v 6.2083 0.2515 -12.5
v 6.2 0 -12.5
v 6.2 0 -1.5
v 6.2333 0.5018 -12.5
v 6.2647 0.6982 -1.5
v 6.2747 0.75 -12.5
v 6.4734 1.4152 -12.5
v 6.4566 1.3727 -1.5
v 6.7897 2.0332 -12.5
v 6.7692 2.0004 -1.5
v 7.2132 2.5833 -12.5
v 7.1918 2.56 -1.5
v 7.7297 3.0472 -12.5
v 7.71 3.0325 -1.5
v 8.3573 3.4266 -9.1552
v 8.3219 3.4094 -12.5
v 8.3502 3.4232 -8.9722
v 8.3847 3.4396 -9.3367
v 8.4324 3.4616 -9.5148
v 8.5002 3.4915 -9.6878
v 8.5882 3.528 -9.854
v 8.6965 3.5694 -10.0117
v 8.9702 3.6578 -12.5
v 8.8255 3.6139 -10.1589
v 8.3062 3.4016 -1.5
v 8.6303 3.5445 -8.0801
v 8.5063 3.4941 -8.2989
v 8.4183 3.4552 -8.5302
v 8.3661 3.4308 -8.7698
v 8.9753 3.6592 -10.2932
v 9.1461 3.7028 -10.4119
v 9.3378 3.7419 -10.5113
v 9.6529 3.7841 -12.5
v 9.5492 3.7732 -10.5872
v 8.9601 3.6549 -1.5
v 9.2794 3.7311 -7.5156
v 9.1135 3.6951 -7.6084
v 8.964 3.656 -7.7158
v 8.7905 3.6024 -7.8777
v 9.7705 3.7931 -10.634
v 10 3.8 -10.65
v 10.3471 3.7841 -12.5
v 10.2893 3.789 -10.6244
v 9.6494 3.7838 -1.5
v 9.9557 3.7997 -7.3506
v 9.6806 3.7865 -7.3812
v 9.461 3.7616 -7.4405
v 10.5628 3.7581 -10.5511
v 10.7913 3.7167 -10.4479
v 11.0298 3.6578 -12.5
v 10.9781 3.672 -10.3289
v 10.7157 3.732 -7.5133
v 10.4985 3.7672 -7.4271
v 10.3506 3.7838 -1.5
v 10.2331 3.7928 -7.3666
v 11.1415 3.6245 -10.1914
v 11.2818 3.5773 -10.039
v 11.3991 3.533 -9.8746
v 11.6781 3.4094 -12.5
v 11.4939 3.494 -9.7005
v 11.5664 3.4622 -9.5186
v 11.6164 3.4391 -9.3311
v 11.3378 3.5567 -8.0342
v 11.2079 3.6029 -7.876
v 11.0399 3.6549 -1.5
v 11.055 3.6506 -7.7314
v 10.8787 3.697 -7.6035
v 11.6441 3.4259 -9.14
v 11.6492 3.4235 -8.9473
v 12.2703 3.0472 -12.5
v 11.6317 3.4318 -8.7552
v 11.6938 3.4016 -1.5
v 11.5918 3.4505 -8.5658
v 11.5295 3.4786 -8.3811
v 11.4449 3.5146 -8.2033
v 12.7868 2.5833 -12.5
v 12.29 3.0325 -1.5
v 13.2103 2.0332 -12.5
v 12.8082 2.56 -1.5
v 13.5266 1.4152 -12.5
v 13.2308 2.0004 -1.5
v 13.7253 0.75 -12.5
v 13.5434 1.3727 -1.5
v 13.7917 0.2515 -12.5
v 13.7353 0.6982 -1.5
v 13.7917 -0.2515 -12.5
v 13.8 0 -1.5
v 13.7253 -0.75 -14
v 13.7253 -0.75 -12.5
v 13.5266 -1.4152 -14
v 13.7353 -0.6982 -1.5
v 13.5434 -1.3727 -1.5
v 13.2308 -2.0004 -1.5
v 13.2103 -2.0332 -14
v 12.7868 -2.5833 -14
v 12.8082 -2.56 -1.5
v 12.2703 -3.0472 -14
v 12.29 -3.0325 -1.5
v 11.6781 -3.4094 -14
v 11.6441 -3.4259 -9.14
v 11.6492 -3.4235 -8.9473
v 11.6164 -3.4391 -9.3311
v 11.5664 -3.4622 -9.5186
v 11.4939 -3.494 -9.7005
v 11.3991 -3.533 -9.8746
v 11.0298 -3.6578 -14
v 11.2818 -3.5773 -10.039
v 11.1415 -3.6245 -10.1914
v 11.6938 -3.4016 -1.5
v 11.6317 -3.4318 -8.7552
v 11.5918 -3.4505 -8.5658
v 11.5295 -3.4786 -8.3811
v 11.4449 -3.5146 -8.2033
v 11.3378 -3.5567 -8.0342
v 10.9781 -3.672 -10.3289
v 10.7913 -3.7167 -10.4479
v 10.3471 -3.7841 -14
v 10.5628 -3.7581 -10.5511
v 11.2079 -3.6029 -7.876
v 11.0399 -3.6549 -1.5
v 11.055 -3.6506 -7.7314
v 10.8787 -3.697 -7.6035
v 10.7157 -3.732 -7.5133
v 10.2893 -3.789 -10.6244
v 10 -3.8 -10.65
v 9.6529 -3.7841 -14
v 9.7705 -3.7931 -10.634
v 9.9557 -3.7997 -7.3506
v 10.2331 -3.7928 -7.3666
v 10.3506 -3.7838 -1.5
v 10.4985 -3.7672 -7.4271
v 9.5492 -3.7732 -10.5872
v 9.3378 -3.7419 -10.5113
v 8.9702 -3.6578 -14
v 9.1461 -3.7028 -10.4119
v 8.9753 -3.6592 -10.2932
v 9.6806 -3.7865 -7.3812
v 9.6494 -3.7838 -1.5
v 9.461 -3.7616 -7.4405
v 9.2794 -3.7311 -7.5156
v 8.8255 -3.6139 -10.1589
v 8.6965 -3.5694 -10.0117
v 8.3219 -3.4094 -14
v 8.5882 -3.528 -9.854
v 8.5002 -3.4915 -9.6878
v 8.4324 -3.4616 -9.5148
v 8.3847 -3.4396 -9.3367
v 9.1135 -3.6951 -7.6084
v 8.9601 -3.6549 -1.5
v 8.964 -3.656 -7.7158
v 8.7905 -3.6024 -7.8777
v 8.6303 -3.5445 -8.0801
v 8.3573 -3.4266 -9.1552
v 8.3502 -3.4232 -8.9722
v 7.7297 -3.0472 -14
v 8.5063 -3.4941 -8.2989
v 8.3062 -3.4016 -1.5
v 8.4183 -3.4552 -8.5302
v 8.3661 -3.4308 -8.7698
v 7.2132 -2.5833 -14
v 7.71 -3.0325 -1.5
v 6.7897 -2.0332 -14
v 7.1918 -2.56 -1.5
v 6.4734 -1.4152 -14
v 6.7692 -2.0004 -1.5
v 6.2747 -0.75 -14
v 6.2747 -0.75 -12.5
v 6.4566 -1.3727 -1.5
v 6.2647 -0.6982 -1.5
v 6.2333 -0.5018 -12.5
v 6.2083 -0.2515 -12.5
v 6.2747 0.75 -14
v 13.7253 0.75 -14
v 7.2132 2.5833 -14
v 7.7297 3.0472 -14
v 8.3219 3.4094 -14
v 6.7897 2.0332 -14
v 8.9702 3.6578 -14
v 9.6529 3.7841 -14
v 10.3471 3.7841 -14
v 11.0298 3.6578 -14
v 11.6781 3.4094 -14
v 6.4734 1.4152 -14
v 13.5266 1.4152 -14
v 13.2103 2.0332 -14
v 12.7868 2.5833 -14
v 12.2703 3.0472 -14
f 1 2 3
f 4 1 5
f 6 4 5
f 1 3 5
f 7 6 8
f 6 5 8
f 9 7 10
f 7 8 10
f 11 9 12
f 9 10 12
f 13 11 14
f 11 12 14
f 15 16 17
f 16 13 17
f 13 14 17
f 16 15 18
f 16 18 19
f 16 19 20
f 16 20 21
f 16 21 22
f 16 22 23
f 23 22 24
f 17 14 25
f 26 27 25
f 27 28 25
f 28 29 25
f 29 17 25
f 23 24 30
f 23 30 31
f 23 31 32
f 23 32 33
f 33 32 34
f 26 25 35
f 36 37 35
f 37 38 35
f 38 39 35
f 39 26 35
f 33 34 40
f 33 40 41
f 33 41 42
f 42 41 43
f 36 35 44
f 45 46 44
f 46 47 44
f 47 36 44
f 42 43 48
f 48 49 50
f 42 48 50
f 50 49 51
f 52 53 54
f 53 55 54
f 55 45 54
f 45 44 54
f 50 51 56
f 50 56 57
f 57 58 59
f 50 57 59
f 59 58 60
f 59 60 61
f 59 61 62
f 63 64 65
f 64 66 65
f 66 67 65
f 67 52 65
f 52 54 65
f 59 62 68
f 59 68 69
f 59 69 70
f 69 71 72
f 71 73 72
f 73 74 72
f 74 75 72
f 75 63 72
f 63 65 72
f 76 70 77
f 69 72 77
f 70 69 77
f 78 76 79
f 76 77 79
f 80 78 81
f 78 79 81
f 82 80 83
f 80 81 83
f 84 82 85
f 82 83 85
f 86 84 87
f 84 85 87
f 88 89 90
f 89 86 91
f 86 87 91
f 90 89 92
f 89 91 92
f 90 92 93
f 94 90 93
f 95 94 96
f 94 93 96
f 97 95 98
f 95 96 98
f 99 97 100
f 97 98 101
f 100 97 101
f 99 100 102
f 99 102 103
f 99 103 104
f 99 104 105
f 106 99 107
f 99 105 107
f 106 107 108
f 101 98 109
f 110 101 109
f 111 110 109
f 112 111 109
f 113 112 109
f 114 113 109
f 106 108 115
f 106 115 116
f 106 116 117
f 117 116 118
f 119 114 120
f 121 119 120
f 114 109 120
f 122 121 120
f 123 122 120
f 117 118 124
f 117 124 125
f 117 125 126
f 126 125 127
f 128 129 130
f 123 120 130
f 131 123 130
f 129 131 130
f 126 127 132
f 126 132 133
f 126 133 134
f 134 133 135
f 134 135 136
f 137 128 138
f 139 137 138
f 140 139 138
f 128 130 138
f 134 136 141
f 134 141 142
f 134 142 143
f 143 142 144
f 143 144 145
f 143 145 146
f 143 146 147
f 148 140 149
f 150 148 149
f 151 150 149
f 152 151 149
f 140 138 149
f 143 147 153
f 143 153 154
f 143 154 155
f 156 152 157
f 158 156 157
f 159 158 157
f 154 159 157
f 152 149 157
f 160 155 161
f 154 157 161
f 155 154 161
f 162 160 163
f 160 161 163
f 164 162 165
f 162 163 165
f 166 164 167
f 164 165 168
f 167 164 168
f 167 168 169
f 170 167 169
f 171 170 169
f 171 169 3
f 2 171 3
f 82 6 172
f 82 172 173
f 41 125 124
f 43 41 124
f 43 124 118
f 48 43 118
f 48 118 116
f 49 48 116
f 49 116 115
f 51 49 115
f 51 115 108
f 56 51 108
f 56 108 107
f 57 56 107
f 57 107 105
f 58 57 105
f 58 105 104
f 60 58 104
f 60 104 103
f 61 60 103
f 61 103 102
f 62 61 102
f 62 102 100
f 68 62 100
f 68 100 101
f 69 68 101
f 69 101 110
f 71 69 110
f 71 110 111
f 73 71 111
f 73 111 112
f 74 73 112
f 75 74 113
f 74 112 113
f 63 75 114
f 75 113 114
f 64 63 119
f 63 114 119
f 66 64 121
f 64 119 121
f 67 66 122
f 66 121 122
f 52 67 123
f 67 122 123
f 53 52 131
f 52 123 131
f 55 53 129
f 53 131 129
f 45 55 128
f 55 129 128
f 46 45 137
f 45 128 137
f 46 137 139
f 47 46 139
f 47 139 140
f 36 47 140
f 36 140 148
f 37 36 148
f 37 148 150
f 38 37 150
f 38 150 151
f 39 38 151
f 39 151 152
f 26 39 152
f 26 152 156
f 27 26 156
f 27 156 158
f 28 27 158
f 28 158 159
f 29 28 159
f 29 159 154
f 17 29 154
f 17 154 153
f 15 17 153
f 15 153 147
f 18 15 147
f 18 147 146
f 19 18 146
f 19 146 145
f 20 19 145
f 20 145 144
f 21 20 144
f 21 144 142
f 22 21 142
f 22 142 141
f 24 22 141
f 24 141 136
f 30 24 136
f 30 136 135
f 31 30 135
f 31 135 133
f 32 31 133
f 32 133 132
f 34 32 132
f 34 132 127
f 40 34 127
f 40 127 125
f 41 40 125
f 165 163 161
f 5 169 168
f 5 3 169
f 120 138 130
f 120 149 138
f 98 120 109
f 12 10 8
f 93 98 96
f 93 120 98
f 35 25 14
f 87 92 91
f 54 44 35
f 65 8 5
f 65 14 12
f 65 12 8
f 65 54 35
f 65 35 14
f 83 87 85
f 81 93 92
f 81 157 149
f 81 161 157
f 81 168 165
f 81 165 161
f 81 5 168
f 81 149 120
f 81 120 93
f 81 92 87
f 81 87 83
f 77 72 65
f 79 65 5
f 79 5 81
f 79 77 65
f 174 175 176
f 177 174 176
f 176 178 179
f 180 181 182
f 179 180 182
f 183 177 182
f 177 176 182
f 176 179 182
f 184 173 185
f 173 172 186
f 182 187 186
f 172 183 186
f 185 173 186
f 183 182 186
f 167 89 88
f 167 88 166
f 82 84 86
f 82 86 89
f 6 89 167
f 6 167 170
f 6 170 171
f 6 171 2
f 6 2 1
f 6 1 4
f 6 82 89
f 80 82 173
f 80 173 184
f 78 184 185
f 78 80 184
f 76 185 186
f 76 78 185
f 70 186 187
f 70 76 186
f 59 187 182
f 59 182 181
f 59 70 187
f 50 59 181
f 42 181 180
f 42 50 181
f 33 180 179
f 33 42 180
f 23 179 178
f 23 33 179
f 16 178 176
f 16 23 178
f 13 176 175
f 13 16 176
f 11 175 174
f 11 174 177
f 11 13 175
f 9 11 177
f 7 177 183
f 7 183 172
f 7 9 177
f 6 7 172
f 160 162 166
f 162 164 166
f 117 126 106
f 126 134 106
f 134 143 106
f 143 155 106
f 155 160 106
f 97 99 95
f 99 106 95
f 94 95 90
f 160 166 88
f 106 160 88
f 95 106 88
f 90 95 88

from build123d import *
from build123d.topology import SkipClean

# Parameters (mm, degrees)
SCHIZZO1_W                   = 3.8
SCHIZZO1_H                   = 12.5
TAGLIO_ESTRUSIONE1_START     = -1.5
TAGLIO_ESTRUSIONE1_DEPTH     = 1.5
ESTRUSIONE_ESTRUSIONE1_DEPTH = 1.5
FORO_3_3_3_3_1_D             = 3.3


with BuildPart() as part:
    # Schizzo1 → Rivoluzione1 (revolve)
    with BuildSketch(Plane.XZ, mode=Mode.PRIVATE) as rivoluzione1_sk:
        with Locations((11.9, -7.75)):
            Rectangle(SCHIZZO1_W, SCHIZZO1_H)
    revolve(rivoluzione1_sk.sketch.rotate(Axis((10, 0, -1.5), (0, 0, -1)), 180), axis=Axis((10, 0, -1.5), (0, 0, -1)))

    # Schizzo2 → Taglio-Estrusione1 (cut)
    with BuildSketch(Plane(origin=(0, 0, -14), x_dir=(-1, 0, 0), z_dir=(0, 0, -1)).offset(TAGLIO_ESTRUSIONE1_START)):
        with BuildLine():
            Line((-13.725251669, -0.75), (-6.274748331, -0.75))
            ThreePointArc((-6.274748331, -0.75), (-10, 3.8), (-13.725251669, -0.75))
        make_face()
    extrude(amount=TAGLIO_ESTRUSIONE1_DEPTH, mode=Mode.SUBTRACT)

    # Schizzo3 → Estrusione-Estrusione1 (add)
    with SkipClean():  # the faces are left unmerged after this step: merging them gives an invalid solid
        with BuildSketch(Plane(origin=(0, 0, -12.5), x_dir=(-1, 0, 0), z_dir=(0, 0, -1))):
            with BuildLine():
                Line((-6.274748331, 0.75), (-13.725251669, 0.75))
                ThreePointArc((-13.725251669, 0.75), (-10, 3.8), (-6.274748331, 0.75))
            make_face()
        extrude(amount=ESTRUSIONE_ESTRUSIONE1_DEPTH)

    # Foro Ø3.3 (3.3)-1 (through all)
    with Locations(Plane(origin=(10, 3.8, -9), x_dir=(0, 0, 1), z_dir=(0, 1, 0))):
        with Locations((0, 0)):
            Hole(FORO_3_3_3_3_1_D / 2)


solid = part.part
